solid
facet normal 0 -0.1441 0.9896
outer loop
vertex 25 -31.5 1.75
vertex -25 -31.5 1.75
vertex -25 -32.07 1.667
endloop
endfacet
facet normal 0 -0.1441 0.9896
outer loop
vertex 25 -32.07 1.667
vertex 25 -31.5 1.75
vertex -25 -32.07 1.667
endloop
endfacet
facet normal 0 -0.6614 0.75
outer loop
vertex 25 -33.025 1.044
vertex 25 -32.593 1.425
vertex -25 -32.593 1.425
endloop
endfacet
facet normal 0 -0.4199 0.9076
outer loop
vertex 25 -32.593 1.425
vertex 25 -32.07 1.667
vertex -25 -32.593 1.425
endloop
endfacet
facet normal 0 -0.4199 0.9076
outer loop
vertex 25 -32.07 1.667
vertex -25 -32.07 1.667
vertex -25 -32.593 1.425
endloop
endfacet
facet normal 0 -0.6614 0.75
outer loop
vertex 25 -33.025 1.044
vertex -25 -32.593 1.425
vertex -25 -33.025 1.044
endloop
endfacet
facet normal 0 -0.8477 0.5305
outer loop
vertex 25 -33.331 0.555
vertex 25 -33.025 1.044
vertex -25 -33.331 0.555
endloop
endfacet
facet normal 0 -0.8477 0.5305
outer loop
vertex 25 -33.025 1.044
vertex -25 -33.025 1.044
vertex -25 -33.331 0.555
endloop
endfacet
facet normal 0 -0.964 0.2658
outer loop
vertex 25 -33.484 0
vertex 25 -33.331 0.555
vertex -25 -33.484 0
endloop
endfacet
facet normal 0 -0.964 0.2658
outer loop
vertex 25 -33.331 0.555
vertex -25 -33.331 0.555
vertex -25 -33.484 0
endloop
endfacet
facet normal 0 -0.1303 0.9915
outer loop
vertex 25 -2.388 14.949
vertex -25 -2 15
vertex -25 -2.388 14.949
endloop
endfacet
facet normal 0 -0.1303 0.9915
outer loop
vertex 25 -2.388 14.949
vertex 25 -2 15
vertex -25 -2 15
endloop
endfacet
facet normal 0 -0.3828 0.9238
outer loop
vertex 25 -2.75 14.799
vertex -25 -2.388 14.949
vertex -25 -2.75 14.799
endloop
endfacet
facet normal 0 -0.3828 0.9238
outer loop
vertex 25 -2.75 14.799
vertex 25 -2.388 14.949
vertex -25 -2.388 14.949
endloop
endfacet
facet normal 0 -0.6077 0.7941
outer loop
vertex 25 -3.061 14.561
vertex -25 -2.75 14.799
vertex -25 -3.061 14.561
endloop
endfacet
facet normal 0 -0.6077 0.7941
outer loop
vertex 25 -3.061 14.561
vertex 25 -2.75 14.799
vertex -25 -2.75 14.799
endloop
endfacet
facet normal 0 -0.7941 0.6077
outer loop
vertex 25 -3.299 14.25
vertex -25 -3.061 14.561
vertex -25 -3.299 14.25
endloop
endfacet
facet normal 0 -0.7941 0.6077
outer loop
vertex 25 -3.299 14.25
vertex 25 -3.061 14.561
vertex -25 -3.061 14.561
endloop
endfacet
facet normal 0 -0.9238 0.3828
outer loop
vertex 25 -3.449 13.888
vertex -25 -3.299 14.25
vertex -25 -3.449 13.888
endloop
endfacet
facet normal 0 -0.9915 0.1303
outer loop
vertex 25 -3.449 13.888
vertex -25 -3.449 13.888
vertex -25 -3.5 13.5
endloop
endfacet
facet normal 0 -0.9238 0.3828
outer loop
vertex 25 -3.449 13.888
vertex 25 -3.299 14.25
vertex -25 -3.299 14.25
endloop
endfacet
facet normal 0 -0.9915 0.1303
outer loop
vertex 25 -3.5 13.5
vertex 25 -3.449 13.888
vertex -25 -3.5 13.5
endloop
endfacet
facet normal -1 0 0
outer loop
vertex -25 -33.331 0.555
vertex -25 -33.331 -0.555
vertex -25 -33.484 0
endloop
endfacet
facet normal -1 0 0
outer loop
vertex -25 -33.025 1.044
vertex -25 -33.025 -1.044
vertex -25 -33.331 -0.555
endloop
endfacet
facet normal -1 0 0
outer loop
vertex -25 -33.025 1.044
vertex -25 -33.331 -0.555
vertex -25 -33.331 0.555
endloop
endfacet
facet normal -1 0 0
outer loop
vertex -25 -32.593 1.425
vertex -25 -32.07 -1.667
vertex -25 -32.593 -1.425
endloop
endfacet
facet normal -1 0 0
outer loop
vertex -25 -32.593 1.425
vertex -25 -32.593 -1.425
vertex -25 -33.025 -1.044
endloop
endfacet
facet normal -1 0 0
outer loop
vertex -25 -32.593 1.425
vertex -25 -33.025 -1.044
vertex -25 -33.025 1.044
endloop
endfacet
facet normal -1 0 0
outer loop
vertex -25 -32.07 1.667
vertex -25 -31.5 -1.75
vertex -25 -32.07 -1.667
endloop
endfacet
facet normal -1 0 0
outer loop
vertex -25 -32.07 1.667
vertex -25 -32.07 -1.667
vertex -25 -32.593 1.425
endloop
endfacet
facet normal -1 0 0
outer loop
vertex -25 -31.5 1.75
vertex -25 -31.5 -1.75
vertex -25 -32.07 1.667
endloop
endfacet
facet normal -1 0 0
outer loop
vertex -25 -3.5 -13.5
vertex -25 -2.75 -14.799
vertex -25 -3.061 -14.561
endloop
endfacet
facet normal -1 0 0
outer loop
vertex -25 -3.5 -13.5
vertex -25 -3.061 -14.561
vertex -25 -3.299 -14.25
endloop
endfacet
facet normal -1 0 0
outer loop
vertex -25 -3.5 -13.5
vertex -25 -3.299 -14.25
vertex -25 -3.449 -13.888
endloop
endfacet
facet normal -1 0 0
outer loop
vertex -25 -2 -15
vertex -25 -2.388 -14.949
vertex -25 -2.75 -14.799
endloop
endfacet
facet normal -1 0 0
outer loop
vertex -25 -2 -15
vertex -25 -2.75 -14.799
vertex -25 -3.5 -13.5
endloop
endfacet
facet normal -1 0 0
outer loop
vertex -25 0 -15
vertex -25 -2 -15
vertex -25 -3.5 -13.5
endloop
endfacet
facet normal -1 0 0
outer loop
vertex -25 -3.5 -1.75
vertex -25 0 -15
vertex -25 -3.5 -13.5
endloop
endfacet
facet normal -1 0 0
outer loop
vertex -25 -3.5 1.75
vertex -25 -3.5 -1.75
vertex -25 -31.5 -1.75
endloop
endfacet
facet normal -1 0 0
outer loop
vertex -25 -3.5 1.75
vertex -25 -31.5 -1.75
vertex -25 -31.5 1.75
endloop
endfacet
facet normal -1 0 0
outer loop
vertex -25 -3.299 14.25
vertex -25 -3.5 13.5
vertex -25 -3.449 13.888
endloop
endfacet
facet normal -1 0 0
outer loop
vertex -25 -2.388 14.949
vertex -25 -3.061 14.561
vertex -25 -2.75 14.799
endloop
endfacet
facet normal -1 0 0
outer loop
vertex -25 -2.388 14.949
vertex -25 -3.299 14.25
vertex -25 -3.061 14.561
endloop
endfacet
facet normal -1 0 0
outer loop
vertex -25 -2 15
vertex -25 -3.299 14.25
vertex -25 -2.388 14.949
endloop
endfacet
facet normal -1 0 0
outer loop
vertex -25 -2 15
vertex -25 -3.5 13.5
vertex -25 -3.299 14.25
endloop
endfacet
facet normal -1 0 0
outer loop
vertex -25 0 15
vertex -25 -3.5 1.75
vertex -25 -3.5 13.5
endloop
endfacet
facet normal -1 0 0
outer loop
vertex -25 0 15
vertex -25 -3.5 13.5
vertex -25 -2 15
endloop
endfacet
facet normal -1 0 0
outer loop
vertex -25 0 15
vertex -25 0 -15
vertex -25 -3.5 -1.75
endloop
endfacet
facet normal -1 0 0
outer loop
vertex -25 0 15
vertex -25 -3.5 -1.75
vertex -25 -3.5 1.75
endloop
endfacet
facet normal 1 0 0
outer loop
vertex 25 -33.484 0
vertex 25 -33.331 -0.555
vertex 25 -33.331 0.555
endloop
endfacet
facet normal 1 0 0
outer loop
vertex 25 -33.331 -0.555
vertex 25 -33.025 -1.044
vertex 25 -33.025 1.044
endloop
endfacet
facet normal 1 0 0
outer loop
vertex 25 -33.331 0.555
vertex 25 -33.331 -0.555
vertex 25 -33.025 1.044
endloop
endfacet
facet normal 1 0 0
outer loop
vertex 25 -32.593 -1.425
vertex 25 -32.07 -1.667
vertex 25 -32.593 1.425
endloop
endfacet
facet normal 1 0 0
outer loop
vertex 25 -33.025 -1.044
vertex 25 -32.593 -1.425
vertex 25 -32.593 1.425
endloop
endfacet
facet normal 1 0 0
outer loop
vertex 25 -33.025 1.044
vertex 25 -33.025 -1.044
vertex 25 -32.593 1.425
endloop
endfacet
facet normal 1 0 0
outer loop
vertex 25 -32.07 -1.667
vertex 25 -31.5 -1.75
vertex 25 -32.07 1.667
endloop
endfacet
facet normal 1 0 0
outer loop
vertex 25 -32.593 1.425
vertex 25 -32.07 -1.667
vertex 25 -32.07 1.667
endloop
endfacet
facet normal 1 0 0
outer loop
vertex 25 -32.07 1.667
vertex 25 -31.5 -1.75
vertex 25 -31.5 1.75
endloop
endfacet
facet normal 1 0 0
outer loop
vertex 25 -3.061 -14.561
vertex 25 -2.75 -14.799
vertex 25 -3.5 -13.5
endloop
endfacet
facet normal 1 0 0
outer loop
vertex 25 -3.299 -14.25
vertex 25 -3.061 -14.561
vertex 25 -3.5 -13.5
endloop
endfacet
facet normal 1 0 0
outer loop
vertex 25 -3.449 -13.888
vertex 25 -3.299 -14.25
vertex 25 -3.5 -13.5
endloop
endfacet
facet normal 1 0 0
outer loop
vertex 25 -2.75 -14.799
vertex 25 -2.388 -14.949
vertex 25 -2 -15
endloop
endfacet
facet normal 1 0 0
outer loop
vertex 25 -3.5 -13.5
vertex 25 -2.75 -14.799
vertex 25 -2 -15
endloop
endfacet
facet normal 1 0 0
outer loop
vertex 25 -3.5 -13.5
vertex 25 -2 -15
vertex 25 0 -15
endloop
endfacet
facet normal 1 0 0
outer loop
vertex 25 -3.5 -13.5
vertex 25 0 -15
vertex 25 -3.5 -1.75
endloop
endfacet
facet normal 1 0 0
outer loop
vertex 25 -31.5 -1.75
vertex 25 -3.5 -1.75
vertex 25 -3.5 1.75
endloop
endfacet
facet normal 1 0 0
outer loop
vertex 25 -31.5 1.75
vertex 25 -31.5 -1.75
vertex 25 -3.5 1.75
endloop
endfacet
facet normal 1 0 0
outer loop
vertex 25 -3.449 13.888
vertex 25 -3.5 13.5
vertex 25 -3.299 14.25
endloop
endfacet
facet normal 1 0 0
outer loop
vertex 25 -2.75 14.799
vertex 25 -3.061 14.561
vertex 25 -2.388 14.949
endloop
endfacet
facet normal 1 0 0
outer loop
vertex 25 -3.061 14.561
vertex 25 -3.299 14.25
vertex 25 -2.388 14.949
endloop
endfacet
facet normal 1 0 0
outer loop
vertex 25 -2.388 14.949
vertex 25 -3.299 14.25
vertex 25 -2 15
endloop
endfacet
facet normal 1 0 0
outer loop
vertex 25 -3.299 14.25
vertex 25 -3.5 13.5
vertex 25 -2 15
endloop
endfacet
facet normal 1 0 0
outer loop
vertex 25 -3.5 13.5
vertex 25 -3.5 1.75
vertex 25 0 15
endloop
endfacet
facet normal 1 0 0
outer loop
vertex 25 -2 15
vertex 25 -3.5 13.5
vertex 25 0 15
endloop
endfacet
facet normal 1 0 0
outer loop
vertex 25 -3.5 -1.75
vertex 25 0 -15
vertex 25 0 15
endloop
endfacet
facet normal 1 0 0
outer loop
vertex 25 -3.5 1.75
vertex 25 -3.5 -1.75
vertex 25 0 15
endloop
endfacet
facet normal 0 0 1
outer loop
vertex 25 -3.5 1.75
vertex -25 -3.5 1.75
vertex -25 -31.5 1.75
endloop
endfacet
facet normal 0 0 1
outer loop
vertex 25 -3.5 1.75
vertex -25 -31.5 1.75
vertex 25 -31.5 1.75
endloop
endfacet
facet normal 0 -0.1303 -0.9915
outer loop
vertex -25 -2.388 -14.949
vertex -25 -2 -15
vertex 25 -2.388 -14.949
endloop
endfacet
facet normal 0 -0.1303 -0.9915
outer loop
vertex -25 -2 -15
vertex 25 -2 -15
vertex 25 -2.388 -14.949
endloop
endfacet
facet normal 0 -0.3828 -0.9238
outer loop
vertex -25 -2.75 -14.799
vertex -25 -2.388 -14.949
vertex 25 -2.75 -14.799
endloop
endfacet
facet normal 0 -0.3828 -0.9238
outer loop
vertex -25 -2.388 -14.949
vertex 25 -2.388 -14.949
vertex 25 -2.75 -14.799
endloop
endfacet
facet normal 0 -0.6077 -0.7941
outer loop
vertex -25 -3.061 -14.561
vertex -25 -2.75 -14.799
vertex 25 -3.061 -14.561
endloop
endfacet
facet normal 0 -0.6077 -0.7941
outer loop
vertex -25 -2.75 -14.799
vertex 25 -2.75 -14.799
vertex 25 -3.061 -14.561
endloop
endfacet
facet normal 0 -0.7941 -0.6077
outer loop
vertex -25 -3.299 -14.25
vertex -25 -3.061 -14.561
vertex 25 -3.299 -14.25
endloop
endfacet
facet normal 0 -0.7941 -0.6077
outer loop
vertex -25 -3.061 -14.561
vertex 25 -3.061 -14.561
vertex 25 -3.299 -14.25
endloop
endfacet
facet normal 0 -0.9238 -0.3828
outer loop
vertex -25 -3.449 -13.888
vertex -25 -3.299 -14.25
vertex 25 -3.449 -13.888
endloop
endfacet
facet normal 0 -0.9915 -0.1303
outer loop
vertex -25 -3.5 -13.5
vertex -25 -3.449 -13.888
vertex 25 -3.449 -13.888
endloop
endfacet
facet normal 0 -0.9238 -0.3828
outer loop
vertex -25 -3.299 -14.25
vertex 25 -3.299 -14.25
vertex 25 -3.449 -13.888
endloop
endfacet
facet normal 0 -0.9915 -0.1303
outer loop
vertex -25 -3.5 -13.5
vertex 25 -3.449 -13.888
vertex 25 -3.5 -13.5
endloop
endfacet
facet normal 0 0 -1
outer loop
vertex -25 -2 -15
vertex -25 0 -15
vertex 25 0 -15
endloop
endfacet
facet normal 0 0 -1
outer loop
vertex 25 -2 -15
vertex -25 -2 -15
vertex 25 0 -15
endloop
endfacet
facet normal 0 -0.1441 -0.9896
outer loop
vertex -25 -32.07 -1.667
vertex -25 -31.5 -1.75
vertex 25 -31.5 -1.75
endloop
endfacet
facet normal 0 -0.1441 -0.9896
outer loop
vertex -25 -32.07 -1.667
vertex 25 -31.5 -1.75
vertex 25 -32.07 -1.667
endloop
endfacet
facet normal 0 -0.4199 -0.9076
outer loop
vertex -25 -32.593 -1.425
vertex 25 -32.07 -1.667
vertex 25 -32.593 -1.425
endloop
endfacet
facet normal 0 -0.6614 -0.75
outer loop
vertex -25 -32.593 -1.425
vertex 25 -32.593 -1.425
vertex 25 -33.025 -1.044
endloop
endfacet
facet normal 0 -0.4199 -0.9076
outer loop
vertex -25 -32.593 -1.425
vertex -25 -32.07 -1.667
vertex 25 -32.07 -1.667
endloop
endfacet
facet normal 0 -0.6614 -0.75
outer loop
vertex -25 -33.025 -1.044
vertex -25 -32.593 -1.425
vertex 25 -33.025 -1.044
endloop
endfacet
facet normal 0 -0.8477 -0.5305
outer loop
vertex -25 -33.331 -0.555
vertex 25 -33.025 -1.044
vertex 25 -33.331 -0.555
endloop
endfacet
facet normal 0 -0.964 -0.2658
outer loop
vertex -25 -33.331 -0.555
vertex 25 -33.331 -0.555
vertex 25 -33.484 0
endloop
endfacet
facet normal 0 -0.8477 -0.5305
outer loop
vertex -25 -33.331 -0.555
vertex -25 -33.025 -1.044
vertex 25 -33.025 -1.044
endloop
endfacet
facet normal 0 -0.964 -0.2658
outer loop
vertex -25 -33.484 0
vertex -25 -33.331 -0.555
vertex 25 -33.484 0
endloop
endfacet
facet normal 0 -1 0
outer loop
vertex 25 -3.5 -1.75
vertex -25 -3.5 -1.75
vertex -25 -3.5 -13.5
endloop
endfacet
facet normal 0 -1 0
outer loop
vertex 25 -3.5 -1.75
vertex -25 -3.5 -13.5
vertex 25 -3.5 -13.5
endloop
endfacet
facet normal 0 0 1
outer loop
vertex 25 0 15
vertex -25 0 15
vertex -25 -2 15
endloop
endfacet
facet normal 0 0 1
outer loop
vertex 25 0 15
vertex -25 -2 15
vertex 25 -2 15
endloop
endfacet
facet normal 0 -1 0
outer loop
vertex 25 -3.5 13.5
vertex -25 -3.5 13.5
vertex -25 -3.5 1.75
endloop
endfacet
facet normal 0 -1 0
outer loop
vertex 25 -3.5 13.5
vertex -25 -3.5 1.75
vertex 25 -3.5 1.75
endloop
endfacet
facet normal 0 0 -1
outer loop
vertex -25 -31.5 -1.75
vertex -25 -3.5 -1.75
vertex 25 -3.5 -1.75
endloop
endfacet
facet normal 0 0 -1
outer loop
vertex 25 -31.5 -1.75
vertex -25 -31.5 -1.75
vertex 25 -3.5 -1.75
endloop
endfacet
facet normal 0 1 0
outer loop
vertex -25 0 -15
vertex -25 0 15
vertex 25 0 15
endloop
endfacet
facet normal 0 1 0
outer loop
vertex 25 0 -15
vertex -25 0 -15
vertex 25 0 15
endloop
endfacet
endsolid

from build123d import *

# Parameters (mm, degrees)
F0_W        = 50
F0_H        = 30
F1_DEPTH    = 3.5
F2_R        = 1.5
F3_W        = 50
F3_H        = 3.5
F4_DEPTH    = 30
F5_T1_DEPTH = 60


# Not quite as in the source:
# - a fillet or chamfer that OpenCascade refuses, or shapes differently, is made with other operations: its cross-section is extruded or revolved along the edge and cut away or added


with BuildPart() as f1:
    # F0 (on Front) → F1 (new body)
    with BuildSketch(Plane.XZ):
        Rectangle(F0_W, F0_H)
    extrude(amount=F1_DEPTH)

    # F2
    f2_edges = [f1.edges().sort_by_distance(p)[0] for p in [
        (0, -3.5, 15),
        (0, -3.5, -15),
    ]]
    fillet(f2_edges, radius=F2_R)

    # F3 (on face) → F4 (join)
    with BuildSketch(Plane.XZ.offset(3.5)):
        Rectangle(F3_W, F3_H)
    extrude(amount=F4_DEPTH)

    # F5: fillet of radius 2 on 2 edges, made by hand

    # F5_s2 → F5_t1 (cut)
    with BuildSketch(Plane.YZ.offset(-30)):
        with BuildLine():
            ThreePointArc((-31.5, -1.75), (-32.9142135624, -1.1642135624), (-33.5, 0.25))
            Line((-33.5, 0.25), (-33.5, -1.75))
            Line((-33.5, -1.75), (-31.5, -1.75))
        make_face()
        with BuildLine():
            ThreePointArc((-31.5, 1.75), (-32.9142135624, 1.1642135624), (-33.5, -0.25))
            Line((-33.5, -0.25), (-33.5, 1.75))
            Line((-33.5, 1.75), (-31.5, 1.75))
        make_face()
    extrude(amount=F5_T1_DEPTH, mode=Mode.SUBTRACT)


solid = f1.part
